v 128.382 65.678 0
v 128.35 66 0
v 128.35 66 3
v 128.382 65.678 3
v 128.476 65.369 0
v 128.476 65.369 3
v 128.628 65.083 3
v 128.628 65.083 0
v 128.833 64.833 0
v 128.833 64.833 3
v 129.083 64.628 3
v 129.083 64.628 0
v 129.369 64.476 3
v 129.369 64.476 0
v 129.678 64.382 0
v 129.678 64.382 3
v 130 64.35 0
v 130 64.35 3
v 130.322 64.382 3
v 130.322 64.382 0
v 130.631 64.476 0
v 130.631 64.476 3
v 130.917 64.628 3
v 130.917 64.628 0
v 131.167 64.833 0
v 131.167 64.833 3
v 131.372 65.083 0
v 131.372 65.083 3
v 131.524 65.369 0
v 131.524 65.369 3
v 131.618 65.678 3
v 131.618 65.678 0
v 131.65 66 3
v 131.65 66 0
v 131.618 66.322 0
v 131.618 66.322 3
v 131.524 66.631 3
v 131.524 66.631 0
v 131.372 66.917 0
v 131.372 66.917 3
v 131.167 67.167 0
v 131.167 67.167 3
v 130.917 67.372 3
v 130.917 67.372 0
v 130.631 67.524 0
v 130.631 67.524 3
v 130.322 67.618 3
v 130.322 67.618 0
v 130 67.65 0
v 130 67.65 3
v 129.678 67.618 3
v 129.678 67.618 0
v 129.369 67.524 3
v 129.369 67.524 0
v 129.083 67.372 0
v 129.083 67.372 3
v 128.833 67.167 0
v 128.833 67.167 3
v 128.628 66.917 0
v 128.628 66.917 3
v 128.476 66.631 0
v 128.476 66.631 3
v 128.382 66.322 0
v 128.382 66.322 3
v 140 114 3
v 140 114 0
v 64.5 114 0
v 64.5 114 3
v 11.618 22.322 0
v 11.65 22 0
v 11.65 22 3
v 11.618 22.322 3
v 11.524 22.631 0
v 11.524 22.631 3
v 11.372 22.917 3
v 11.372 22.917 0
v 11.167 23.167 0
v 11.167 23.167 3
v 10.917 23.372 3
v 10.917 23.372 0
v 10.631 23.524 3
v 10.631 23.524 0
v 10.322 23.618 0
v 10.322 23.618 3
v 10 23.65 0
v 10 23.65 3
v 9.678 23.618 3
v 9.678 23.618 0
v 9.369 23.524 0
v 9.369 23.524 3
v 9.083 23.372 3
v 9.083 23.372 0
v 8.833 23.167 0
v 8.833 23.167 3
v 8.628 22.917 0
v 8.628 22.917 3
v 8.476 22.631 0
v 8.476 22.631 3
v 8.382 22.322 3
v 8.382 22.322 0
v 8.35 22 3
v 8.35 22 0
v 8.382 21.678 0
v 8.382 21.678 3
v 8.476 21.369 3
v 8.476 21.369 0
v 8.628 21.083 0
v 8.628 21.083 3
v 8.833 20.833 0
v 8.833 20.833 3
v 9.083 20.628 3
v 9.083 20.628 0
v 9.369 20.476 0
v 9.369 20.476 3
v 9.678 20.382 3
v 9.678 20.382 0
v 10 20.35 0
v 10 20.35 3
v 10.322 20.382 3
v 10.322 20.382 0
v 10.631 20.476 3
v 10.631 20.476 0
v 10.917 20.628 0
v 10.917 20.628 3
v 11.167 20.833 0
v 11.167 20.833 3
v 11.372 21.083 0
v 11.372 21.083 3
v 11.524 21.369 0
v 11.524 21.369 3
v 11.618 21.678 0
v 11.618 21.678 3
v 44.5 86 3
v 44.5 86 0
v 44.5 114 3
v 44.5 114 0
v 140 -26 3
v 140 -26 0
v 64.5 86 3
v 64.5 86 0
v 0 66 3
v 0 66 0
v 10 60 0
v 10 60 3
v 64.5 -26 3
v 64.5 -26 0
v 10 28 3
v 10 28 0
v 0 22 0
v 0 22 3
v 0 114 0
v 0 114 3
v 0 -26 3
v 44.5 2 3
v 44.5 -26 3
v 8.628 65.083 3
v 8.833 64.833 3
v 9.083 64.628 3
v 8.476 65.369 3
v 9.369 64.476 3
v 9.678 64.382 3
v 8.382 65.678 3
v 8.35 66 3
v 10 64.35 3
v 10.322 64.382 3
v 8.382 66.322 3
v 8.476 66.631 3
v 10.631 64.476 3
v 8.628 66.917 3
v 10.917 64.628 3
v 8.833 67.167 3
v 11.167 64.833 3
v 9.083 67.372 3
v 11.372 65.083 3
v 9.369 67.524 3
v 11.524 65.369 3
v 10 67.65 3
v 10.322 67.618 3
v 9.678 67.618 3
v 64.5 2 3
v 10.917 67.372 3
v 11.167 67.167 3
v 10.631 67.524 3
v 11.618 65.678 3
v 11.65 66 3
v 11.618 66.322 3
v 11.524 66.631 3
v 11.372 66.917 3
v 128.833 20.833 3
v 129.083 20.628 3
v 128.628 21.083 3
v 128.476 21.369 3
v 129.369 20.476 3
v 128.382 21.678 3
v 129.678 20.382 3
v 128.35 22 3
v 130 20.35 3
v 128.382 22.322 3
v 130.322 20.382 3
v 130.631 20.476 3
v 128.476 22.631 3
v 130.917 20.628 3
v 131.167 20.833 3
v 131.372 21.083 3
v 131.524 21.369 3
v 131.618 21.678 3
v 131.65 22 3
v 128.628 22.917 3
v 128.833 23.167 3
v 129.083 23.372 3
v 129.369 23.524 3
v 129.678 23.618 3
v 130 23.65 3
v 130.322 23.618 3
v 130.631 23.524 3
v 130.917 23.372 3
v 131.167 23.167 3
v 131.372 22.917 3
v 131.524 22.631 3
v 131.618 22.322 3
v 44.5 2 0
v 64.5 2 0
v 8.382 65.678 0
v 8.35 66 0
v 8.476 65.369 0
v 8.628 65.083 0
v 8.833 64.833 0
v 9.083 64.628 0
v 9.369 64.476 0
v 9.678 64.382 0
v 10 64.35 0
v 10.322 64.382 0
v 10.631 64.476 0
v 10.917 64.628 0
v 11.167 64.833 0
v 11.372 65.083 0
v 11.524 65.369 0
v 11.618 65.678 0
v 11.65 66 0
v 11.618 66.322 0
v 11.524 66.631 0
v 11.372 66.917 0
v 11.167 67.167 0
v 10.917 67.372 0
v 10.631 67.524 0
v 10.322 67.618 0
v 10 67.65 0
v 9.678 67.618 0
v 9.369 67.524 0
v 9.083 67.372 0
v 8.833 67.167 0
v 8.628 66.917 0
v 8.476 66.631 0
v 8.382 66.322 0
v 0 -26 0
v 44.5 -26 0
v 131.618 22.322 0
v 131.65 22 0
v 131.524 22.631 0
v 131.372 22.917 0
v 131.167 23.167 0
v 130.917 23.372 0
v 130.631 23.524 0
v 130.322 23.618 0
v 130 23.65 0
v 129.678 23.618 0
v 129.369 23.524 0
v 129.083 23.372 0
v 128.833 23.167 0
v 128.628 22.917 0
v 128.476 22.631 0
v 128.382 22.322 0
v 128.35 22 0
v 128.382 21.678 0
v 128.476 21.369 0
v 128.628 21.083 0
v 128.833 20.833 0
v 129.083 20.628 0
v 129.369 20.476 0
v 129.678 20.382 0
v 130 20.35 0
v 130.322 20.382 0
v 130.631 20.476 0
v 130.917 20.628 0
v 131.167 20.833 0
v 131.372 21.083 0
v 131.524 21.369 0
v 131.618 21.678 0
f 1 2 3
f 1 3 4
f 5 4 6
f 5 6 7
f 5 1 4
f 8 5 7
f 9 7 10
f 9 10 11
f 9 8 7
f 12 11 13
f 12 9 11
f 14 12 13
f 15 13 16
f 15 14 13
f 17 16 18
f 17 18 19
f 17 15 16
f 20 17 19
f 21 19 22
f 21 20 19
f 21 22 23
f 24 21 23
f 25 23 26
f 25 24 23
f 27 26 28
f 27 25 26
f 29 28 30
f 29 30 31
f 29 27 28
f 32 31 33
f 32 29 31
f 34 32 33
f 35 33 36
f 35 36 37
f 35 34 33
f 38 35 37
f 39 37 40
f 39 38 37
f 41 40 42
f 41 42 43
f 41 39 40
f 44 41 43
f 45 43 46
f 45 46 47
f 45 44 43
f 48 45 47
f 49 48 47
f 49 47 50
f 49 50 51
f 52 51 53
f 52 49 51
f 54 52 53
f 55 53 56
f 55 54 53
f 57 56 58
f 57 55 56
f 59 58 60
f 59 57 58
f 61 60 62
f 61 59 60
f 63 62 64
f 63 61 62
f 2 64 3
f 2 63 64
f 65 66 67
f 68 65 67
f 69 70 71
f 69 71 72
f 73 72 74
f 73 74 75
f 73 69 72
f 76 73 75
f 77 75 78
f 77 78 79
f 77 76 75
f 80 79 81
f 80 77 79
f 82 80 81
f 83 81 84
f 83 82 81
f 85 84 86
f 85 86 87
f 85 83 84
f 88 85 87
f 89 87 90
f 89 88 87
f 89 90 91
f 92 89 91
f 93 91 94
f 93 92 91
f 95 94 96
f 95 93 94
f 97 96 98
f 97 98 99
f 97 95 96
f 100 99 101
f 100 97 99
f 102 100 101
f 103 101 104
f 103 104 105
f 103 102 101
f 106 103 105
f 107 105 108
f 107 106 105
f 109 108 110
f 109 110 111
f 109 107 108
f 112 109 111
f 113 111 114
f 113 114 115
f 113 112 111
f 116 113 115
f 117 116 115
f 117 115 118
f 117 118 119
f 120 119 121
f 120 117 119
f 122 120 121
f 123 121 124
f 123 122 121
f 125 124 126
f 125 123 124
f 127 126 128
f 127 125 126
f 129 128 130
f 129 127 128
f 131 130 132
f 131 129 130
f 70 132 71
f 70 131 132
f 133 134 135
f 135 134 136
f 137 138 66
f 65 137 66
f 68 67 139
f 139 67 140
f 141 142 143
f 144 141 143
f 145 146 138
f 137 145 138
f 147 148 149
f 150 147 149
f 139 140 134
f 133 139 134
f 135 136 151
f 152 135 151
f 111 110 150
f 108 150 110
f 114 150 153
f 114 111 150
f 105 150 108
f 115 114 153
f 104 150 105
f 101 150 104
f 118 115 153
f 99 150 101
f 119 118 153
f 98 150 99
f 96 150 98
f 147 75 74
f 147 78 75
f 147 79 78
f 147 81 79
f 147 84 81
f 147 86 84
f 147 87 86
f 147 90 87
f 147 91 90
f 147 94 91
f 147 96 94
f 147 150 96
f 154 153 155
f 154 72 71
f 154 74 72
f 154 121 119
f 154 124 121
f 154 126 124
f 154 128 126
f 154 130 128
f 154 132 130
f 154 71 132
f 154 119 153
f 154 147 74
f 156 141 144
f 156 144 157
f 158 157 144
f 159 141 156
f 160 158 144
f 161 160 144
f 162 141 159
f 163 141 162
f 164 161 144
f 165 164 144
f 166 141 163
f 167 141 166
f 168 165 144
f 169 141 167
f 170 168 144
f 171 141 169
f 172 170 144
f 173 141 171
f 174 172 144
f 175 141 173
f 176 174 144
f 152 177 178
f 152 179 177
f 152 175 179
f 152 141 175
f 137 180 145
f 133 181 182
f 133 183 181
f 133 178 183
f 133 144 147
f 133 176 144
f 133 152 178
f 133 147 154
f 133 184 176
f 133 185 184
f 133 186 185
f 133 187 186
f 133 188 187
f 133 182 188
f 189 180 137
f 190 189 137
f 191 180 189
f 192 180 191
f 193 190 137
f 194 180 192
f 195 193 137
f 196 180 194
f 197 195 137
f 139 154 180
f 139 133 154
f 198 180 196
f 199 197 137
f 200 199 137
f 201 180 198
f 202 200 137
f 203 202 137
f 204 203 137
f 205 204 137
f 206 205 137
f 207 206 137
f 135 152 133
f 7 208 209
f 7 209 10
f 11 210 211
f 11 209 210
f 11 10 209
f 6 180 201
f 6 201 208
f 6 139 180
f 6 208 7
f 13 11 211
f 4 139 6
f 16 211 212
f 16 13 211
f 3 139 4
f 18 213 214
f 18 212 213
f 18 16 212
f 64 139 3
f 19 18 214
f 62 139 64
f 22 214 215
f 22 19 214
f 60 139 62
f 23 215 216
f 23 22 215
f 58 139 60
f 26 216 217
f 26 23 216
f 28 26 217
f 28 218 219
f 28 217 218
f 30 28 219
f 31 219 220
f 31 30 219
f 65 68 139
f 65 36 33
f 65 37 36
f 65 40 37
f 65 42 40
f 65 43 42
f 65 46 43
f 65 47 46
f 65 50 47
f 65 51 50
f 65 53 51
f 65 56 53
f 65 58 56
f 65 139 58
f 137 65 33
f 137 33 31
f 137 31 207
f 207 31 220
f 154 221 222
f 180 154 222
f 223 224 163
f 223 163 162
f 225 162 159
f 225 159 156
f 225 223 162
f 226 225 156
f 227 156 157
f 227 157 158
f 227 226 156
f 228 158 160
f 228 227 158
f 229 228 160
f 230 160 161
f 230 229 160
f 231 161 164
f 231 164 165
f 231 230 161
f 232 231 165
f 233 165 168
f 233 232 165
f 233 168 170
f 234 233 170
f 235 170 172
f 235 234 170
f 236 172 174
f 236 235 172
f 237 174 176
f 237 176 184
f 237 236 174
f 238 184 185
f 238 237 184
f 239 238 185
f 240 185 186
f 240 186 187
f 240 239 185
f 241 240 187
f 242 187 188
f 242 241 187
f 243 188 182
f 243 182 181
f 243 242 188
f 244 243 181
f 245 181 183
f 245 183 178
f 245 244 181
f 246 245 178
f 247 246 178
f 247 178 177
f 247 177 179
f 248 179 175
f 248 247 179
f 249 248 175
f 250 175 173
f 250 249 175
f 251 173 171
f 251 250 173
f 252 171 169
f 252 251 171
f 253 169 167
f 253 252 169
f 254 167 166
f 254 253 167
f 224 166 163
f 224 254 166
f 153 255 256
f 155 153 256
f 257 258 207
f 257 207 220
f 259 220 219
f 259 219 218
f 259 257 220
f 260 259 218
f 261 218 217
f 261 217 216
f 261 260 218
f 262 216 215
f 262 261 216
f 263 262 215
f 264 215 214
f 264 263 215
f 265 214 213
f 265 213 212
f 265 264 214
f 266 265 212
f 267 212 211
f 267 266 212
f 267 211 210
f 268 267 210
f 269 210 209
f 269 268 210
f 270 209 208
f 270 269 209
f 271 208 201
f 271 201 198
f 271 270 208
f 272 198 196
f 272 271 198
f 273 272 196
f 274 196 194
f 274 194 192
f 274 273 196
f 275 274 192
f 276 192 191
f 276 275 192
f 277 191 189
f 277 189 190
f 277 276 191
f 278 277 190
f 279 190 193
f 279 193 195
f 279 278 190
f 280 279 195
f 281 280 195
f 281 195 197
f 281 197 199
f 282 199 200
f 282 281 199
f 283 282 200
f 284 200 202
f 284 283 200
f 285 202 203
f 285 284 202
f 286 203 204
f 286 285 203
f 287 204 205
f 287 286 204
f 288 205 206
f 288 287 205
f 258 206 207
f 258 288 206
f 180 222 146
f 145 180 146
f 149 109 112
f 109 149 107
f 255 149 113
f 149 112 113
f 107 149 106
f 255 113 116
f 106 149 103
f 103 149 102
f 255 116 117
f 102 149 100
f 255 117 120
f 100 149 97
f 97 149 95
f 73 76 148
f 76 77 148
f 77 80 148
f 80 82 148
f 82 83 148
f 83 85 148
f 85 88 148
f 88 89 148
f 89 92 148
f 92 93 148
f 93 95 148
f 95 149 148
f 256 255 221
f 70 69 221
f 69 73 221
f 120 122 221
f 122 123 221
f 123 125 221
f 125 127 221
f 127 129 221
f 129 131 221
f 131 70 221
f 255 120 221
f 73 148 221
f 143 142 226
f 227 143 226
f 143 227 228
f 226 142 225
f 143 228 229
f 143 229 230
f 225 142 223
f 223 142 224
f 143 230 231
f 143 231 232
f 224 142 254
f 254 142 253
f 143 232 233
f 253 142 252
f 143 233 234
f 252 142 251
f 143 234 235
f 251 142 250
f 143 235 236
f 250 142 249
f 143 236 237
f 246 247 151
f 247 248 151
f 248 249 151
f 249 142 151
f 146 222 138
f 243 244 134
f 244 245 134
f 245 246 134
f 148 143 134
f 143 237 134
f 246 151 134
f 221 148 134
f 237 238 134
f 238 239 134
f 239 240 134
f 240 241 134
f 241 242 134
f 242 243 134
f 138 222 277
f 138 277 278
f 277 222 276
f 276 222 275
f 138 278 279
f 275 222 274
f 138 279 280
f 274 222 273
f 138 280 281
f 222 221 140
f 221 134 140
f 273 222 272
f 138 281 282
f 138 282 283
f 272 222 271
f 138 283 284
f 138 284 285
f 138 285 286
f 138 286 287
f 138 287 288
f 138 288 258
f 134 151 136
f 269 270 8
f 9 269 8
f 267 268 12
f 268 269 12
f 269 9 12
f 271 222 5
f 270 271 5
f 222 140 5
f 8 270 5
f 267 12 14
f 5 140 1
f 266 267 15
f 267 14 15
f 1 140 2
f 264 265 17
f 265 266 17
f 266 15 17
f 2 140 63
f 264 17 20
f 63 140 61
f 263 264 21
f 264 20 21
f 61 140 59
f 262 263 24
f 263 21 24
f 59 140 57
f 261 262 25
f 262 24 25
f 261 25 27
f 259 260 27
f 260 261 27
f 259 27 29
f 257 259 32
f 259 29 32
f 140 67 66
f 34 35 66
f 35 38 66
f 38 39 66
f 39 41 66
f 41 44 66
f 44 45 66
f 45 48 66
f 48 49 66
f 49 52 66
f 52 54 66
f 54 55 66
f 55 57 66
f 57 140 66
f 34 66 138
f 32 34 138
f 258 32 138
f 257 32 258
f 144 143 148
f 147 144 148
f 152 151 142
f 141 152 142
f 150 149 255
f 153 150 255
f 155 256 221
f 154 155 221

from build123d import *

# Parameters (mm, degrees)
SKETCH1_R           = 1.65
BOSS_EXTRUDE1_DEPTH = 3


with BuildPart() as part:
    # Sketch1 → Boss-Extrude1 (new body)
    with BuildSketch(Plane.XY):
        Polygon((0, -26), (44.5, -26), (44.5, 2), (64.5, 2), (64.5, -26), (140, -26), (140, 22), (140, 66), (140, 114), (64.5, 114), (64.5, 86), (44.5, 86), (44.5, 114), (0, 114), (0, 66), (10, 60), (10, 28), (0, 22), align=None)
        with Locations((10, 22)):
            Circle(SKETCH1_R, mode=Mode.SUBTRACT)
        with Locations(Location((130, 66, 0), (0, 0, 180))):
            Circle(SKETCH1_R, mode=Mode.SUBTRACT)
        with Locations((130, 22)):
            Circle(SKETCH1_R, mode=Mode.SUBTRACT)
        with Locations(Location((10, 66, 0), (0, 0, 180))):
            Circle(SKETCH1_R, mode=Mode.SUBTRACT)
    extrude(amount=BOSS_EXTRUDE1_DEPTH)


solid = part.part
